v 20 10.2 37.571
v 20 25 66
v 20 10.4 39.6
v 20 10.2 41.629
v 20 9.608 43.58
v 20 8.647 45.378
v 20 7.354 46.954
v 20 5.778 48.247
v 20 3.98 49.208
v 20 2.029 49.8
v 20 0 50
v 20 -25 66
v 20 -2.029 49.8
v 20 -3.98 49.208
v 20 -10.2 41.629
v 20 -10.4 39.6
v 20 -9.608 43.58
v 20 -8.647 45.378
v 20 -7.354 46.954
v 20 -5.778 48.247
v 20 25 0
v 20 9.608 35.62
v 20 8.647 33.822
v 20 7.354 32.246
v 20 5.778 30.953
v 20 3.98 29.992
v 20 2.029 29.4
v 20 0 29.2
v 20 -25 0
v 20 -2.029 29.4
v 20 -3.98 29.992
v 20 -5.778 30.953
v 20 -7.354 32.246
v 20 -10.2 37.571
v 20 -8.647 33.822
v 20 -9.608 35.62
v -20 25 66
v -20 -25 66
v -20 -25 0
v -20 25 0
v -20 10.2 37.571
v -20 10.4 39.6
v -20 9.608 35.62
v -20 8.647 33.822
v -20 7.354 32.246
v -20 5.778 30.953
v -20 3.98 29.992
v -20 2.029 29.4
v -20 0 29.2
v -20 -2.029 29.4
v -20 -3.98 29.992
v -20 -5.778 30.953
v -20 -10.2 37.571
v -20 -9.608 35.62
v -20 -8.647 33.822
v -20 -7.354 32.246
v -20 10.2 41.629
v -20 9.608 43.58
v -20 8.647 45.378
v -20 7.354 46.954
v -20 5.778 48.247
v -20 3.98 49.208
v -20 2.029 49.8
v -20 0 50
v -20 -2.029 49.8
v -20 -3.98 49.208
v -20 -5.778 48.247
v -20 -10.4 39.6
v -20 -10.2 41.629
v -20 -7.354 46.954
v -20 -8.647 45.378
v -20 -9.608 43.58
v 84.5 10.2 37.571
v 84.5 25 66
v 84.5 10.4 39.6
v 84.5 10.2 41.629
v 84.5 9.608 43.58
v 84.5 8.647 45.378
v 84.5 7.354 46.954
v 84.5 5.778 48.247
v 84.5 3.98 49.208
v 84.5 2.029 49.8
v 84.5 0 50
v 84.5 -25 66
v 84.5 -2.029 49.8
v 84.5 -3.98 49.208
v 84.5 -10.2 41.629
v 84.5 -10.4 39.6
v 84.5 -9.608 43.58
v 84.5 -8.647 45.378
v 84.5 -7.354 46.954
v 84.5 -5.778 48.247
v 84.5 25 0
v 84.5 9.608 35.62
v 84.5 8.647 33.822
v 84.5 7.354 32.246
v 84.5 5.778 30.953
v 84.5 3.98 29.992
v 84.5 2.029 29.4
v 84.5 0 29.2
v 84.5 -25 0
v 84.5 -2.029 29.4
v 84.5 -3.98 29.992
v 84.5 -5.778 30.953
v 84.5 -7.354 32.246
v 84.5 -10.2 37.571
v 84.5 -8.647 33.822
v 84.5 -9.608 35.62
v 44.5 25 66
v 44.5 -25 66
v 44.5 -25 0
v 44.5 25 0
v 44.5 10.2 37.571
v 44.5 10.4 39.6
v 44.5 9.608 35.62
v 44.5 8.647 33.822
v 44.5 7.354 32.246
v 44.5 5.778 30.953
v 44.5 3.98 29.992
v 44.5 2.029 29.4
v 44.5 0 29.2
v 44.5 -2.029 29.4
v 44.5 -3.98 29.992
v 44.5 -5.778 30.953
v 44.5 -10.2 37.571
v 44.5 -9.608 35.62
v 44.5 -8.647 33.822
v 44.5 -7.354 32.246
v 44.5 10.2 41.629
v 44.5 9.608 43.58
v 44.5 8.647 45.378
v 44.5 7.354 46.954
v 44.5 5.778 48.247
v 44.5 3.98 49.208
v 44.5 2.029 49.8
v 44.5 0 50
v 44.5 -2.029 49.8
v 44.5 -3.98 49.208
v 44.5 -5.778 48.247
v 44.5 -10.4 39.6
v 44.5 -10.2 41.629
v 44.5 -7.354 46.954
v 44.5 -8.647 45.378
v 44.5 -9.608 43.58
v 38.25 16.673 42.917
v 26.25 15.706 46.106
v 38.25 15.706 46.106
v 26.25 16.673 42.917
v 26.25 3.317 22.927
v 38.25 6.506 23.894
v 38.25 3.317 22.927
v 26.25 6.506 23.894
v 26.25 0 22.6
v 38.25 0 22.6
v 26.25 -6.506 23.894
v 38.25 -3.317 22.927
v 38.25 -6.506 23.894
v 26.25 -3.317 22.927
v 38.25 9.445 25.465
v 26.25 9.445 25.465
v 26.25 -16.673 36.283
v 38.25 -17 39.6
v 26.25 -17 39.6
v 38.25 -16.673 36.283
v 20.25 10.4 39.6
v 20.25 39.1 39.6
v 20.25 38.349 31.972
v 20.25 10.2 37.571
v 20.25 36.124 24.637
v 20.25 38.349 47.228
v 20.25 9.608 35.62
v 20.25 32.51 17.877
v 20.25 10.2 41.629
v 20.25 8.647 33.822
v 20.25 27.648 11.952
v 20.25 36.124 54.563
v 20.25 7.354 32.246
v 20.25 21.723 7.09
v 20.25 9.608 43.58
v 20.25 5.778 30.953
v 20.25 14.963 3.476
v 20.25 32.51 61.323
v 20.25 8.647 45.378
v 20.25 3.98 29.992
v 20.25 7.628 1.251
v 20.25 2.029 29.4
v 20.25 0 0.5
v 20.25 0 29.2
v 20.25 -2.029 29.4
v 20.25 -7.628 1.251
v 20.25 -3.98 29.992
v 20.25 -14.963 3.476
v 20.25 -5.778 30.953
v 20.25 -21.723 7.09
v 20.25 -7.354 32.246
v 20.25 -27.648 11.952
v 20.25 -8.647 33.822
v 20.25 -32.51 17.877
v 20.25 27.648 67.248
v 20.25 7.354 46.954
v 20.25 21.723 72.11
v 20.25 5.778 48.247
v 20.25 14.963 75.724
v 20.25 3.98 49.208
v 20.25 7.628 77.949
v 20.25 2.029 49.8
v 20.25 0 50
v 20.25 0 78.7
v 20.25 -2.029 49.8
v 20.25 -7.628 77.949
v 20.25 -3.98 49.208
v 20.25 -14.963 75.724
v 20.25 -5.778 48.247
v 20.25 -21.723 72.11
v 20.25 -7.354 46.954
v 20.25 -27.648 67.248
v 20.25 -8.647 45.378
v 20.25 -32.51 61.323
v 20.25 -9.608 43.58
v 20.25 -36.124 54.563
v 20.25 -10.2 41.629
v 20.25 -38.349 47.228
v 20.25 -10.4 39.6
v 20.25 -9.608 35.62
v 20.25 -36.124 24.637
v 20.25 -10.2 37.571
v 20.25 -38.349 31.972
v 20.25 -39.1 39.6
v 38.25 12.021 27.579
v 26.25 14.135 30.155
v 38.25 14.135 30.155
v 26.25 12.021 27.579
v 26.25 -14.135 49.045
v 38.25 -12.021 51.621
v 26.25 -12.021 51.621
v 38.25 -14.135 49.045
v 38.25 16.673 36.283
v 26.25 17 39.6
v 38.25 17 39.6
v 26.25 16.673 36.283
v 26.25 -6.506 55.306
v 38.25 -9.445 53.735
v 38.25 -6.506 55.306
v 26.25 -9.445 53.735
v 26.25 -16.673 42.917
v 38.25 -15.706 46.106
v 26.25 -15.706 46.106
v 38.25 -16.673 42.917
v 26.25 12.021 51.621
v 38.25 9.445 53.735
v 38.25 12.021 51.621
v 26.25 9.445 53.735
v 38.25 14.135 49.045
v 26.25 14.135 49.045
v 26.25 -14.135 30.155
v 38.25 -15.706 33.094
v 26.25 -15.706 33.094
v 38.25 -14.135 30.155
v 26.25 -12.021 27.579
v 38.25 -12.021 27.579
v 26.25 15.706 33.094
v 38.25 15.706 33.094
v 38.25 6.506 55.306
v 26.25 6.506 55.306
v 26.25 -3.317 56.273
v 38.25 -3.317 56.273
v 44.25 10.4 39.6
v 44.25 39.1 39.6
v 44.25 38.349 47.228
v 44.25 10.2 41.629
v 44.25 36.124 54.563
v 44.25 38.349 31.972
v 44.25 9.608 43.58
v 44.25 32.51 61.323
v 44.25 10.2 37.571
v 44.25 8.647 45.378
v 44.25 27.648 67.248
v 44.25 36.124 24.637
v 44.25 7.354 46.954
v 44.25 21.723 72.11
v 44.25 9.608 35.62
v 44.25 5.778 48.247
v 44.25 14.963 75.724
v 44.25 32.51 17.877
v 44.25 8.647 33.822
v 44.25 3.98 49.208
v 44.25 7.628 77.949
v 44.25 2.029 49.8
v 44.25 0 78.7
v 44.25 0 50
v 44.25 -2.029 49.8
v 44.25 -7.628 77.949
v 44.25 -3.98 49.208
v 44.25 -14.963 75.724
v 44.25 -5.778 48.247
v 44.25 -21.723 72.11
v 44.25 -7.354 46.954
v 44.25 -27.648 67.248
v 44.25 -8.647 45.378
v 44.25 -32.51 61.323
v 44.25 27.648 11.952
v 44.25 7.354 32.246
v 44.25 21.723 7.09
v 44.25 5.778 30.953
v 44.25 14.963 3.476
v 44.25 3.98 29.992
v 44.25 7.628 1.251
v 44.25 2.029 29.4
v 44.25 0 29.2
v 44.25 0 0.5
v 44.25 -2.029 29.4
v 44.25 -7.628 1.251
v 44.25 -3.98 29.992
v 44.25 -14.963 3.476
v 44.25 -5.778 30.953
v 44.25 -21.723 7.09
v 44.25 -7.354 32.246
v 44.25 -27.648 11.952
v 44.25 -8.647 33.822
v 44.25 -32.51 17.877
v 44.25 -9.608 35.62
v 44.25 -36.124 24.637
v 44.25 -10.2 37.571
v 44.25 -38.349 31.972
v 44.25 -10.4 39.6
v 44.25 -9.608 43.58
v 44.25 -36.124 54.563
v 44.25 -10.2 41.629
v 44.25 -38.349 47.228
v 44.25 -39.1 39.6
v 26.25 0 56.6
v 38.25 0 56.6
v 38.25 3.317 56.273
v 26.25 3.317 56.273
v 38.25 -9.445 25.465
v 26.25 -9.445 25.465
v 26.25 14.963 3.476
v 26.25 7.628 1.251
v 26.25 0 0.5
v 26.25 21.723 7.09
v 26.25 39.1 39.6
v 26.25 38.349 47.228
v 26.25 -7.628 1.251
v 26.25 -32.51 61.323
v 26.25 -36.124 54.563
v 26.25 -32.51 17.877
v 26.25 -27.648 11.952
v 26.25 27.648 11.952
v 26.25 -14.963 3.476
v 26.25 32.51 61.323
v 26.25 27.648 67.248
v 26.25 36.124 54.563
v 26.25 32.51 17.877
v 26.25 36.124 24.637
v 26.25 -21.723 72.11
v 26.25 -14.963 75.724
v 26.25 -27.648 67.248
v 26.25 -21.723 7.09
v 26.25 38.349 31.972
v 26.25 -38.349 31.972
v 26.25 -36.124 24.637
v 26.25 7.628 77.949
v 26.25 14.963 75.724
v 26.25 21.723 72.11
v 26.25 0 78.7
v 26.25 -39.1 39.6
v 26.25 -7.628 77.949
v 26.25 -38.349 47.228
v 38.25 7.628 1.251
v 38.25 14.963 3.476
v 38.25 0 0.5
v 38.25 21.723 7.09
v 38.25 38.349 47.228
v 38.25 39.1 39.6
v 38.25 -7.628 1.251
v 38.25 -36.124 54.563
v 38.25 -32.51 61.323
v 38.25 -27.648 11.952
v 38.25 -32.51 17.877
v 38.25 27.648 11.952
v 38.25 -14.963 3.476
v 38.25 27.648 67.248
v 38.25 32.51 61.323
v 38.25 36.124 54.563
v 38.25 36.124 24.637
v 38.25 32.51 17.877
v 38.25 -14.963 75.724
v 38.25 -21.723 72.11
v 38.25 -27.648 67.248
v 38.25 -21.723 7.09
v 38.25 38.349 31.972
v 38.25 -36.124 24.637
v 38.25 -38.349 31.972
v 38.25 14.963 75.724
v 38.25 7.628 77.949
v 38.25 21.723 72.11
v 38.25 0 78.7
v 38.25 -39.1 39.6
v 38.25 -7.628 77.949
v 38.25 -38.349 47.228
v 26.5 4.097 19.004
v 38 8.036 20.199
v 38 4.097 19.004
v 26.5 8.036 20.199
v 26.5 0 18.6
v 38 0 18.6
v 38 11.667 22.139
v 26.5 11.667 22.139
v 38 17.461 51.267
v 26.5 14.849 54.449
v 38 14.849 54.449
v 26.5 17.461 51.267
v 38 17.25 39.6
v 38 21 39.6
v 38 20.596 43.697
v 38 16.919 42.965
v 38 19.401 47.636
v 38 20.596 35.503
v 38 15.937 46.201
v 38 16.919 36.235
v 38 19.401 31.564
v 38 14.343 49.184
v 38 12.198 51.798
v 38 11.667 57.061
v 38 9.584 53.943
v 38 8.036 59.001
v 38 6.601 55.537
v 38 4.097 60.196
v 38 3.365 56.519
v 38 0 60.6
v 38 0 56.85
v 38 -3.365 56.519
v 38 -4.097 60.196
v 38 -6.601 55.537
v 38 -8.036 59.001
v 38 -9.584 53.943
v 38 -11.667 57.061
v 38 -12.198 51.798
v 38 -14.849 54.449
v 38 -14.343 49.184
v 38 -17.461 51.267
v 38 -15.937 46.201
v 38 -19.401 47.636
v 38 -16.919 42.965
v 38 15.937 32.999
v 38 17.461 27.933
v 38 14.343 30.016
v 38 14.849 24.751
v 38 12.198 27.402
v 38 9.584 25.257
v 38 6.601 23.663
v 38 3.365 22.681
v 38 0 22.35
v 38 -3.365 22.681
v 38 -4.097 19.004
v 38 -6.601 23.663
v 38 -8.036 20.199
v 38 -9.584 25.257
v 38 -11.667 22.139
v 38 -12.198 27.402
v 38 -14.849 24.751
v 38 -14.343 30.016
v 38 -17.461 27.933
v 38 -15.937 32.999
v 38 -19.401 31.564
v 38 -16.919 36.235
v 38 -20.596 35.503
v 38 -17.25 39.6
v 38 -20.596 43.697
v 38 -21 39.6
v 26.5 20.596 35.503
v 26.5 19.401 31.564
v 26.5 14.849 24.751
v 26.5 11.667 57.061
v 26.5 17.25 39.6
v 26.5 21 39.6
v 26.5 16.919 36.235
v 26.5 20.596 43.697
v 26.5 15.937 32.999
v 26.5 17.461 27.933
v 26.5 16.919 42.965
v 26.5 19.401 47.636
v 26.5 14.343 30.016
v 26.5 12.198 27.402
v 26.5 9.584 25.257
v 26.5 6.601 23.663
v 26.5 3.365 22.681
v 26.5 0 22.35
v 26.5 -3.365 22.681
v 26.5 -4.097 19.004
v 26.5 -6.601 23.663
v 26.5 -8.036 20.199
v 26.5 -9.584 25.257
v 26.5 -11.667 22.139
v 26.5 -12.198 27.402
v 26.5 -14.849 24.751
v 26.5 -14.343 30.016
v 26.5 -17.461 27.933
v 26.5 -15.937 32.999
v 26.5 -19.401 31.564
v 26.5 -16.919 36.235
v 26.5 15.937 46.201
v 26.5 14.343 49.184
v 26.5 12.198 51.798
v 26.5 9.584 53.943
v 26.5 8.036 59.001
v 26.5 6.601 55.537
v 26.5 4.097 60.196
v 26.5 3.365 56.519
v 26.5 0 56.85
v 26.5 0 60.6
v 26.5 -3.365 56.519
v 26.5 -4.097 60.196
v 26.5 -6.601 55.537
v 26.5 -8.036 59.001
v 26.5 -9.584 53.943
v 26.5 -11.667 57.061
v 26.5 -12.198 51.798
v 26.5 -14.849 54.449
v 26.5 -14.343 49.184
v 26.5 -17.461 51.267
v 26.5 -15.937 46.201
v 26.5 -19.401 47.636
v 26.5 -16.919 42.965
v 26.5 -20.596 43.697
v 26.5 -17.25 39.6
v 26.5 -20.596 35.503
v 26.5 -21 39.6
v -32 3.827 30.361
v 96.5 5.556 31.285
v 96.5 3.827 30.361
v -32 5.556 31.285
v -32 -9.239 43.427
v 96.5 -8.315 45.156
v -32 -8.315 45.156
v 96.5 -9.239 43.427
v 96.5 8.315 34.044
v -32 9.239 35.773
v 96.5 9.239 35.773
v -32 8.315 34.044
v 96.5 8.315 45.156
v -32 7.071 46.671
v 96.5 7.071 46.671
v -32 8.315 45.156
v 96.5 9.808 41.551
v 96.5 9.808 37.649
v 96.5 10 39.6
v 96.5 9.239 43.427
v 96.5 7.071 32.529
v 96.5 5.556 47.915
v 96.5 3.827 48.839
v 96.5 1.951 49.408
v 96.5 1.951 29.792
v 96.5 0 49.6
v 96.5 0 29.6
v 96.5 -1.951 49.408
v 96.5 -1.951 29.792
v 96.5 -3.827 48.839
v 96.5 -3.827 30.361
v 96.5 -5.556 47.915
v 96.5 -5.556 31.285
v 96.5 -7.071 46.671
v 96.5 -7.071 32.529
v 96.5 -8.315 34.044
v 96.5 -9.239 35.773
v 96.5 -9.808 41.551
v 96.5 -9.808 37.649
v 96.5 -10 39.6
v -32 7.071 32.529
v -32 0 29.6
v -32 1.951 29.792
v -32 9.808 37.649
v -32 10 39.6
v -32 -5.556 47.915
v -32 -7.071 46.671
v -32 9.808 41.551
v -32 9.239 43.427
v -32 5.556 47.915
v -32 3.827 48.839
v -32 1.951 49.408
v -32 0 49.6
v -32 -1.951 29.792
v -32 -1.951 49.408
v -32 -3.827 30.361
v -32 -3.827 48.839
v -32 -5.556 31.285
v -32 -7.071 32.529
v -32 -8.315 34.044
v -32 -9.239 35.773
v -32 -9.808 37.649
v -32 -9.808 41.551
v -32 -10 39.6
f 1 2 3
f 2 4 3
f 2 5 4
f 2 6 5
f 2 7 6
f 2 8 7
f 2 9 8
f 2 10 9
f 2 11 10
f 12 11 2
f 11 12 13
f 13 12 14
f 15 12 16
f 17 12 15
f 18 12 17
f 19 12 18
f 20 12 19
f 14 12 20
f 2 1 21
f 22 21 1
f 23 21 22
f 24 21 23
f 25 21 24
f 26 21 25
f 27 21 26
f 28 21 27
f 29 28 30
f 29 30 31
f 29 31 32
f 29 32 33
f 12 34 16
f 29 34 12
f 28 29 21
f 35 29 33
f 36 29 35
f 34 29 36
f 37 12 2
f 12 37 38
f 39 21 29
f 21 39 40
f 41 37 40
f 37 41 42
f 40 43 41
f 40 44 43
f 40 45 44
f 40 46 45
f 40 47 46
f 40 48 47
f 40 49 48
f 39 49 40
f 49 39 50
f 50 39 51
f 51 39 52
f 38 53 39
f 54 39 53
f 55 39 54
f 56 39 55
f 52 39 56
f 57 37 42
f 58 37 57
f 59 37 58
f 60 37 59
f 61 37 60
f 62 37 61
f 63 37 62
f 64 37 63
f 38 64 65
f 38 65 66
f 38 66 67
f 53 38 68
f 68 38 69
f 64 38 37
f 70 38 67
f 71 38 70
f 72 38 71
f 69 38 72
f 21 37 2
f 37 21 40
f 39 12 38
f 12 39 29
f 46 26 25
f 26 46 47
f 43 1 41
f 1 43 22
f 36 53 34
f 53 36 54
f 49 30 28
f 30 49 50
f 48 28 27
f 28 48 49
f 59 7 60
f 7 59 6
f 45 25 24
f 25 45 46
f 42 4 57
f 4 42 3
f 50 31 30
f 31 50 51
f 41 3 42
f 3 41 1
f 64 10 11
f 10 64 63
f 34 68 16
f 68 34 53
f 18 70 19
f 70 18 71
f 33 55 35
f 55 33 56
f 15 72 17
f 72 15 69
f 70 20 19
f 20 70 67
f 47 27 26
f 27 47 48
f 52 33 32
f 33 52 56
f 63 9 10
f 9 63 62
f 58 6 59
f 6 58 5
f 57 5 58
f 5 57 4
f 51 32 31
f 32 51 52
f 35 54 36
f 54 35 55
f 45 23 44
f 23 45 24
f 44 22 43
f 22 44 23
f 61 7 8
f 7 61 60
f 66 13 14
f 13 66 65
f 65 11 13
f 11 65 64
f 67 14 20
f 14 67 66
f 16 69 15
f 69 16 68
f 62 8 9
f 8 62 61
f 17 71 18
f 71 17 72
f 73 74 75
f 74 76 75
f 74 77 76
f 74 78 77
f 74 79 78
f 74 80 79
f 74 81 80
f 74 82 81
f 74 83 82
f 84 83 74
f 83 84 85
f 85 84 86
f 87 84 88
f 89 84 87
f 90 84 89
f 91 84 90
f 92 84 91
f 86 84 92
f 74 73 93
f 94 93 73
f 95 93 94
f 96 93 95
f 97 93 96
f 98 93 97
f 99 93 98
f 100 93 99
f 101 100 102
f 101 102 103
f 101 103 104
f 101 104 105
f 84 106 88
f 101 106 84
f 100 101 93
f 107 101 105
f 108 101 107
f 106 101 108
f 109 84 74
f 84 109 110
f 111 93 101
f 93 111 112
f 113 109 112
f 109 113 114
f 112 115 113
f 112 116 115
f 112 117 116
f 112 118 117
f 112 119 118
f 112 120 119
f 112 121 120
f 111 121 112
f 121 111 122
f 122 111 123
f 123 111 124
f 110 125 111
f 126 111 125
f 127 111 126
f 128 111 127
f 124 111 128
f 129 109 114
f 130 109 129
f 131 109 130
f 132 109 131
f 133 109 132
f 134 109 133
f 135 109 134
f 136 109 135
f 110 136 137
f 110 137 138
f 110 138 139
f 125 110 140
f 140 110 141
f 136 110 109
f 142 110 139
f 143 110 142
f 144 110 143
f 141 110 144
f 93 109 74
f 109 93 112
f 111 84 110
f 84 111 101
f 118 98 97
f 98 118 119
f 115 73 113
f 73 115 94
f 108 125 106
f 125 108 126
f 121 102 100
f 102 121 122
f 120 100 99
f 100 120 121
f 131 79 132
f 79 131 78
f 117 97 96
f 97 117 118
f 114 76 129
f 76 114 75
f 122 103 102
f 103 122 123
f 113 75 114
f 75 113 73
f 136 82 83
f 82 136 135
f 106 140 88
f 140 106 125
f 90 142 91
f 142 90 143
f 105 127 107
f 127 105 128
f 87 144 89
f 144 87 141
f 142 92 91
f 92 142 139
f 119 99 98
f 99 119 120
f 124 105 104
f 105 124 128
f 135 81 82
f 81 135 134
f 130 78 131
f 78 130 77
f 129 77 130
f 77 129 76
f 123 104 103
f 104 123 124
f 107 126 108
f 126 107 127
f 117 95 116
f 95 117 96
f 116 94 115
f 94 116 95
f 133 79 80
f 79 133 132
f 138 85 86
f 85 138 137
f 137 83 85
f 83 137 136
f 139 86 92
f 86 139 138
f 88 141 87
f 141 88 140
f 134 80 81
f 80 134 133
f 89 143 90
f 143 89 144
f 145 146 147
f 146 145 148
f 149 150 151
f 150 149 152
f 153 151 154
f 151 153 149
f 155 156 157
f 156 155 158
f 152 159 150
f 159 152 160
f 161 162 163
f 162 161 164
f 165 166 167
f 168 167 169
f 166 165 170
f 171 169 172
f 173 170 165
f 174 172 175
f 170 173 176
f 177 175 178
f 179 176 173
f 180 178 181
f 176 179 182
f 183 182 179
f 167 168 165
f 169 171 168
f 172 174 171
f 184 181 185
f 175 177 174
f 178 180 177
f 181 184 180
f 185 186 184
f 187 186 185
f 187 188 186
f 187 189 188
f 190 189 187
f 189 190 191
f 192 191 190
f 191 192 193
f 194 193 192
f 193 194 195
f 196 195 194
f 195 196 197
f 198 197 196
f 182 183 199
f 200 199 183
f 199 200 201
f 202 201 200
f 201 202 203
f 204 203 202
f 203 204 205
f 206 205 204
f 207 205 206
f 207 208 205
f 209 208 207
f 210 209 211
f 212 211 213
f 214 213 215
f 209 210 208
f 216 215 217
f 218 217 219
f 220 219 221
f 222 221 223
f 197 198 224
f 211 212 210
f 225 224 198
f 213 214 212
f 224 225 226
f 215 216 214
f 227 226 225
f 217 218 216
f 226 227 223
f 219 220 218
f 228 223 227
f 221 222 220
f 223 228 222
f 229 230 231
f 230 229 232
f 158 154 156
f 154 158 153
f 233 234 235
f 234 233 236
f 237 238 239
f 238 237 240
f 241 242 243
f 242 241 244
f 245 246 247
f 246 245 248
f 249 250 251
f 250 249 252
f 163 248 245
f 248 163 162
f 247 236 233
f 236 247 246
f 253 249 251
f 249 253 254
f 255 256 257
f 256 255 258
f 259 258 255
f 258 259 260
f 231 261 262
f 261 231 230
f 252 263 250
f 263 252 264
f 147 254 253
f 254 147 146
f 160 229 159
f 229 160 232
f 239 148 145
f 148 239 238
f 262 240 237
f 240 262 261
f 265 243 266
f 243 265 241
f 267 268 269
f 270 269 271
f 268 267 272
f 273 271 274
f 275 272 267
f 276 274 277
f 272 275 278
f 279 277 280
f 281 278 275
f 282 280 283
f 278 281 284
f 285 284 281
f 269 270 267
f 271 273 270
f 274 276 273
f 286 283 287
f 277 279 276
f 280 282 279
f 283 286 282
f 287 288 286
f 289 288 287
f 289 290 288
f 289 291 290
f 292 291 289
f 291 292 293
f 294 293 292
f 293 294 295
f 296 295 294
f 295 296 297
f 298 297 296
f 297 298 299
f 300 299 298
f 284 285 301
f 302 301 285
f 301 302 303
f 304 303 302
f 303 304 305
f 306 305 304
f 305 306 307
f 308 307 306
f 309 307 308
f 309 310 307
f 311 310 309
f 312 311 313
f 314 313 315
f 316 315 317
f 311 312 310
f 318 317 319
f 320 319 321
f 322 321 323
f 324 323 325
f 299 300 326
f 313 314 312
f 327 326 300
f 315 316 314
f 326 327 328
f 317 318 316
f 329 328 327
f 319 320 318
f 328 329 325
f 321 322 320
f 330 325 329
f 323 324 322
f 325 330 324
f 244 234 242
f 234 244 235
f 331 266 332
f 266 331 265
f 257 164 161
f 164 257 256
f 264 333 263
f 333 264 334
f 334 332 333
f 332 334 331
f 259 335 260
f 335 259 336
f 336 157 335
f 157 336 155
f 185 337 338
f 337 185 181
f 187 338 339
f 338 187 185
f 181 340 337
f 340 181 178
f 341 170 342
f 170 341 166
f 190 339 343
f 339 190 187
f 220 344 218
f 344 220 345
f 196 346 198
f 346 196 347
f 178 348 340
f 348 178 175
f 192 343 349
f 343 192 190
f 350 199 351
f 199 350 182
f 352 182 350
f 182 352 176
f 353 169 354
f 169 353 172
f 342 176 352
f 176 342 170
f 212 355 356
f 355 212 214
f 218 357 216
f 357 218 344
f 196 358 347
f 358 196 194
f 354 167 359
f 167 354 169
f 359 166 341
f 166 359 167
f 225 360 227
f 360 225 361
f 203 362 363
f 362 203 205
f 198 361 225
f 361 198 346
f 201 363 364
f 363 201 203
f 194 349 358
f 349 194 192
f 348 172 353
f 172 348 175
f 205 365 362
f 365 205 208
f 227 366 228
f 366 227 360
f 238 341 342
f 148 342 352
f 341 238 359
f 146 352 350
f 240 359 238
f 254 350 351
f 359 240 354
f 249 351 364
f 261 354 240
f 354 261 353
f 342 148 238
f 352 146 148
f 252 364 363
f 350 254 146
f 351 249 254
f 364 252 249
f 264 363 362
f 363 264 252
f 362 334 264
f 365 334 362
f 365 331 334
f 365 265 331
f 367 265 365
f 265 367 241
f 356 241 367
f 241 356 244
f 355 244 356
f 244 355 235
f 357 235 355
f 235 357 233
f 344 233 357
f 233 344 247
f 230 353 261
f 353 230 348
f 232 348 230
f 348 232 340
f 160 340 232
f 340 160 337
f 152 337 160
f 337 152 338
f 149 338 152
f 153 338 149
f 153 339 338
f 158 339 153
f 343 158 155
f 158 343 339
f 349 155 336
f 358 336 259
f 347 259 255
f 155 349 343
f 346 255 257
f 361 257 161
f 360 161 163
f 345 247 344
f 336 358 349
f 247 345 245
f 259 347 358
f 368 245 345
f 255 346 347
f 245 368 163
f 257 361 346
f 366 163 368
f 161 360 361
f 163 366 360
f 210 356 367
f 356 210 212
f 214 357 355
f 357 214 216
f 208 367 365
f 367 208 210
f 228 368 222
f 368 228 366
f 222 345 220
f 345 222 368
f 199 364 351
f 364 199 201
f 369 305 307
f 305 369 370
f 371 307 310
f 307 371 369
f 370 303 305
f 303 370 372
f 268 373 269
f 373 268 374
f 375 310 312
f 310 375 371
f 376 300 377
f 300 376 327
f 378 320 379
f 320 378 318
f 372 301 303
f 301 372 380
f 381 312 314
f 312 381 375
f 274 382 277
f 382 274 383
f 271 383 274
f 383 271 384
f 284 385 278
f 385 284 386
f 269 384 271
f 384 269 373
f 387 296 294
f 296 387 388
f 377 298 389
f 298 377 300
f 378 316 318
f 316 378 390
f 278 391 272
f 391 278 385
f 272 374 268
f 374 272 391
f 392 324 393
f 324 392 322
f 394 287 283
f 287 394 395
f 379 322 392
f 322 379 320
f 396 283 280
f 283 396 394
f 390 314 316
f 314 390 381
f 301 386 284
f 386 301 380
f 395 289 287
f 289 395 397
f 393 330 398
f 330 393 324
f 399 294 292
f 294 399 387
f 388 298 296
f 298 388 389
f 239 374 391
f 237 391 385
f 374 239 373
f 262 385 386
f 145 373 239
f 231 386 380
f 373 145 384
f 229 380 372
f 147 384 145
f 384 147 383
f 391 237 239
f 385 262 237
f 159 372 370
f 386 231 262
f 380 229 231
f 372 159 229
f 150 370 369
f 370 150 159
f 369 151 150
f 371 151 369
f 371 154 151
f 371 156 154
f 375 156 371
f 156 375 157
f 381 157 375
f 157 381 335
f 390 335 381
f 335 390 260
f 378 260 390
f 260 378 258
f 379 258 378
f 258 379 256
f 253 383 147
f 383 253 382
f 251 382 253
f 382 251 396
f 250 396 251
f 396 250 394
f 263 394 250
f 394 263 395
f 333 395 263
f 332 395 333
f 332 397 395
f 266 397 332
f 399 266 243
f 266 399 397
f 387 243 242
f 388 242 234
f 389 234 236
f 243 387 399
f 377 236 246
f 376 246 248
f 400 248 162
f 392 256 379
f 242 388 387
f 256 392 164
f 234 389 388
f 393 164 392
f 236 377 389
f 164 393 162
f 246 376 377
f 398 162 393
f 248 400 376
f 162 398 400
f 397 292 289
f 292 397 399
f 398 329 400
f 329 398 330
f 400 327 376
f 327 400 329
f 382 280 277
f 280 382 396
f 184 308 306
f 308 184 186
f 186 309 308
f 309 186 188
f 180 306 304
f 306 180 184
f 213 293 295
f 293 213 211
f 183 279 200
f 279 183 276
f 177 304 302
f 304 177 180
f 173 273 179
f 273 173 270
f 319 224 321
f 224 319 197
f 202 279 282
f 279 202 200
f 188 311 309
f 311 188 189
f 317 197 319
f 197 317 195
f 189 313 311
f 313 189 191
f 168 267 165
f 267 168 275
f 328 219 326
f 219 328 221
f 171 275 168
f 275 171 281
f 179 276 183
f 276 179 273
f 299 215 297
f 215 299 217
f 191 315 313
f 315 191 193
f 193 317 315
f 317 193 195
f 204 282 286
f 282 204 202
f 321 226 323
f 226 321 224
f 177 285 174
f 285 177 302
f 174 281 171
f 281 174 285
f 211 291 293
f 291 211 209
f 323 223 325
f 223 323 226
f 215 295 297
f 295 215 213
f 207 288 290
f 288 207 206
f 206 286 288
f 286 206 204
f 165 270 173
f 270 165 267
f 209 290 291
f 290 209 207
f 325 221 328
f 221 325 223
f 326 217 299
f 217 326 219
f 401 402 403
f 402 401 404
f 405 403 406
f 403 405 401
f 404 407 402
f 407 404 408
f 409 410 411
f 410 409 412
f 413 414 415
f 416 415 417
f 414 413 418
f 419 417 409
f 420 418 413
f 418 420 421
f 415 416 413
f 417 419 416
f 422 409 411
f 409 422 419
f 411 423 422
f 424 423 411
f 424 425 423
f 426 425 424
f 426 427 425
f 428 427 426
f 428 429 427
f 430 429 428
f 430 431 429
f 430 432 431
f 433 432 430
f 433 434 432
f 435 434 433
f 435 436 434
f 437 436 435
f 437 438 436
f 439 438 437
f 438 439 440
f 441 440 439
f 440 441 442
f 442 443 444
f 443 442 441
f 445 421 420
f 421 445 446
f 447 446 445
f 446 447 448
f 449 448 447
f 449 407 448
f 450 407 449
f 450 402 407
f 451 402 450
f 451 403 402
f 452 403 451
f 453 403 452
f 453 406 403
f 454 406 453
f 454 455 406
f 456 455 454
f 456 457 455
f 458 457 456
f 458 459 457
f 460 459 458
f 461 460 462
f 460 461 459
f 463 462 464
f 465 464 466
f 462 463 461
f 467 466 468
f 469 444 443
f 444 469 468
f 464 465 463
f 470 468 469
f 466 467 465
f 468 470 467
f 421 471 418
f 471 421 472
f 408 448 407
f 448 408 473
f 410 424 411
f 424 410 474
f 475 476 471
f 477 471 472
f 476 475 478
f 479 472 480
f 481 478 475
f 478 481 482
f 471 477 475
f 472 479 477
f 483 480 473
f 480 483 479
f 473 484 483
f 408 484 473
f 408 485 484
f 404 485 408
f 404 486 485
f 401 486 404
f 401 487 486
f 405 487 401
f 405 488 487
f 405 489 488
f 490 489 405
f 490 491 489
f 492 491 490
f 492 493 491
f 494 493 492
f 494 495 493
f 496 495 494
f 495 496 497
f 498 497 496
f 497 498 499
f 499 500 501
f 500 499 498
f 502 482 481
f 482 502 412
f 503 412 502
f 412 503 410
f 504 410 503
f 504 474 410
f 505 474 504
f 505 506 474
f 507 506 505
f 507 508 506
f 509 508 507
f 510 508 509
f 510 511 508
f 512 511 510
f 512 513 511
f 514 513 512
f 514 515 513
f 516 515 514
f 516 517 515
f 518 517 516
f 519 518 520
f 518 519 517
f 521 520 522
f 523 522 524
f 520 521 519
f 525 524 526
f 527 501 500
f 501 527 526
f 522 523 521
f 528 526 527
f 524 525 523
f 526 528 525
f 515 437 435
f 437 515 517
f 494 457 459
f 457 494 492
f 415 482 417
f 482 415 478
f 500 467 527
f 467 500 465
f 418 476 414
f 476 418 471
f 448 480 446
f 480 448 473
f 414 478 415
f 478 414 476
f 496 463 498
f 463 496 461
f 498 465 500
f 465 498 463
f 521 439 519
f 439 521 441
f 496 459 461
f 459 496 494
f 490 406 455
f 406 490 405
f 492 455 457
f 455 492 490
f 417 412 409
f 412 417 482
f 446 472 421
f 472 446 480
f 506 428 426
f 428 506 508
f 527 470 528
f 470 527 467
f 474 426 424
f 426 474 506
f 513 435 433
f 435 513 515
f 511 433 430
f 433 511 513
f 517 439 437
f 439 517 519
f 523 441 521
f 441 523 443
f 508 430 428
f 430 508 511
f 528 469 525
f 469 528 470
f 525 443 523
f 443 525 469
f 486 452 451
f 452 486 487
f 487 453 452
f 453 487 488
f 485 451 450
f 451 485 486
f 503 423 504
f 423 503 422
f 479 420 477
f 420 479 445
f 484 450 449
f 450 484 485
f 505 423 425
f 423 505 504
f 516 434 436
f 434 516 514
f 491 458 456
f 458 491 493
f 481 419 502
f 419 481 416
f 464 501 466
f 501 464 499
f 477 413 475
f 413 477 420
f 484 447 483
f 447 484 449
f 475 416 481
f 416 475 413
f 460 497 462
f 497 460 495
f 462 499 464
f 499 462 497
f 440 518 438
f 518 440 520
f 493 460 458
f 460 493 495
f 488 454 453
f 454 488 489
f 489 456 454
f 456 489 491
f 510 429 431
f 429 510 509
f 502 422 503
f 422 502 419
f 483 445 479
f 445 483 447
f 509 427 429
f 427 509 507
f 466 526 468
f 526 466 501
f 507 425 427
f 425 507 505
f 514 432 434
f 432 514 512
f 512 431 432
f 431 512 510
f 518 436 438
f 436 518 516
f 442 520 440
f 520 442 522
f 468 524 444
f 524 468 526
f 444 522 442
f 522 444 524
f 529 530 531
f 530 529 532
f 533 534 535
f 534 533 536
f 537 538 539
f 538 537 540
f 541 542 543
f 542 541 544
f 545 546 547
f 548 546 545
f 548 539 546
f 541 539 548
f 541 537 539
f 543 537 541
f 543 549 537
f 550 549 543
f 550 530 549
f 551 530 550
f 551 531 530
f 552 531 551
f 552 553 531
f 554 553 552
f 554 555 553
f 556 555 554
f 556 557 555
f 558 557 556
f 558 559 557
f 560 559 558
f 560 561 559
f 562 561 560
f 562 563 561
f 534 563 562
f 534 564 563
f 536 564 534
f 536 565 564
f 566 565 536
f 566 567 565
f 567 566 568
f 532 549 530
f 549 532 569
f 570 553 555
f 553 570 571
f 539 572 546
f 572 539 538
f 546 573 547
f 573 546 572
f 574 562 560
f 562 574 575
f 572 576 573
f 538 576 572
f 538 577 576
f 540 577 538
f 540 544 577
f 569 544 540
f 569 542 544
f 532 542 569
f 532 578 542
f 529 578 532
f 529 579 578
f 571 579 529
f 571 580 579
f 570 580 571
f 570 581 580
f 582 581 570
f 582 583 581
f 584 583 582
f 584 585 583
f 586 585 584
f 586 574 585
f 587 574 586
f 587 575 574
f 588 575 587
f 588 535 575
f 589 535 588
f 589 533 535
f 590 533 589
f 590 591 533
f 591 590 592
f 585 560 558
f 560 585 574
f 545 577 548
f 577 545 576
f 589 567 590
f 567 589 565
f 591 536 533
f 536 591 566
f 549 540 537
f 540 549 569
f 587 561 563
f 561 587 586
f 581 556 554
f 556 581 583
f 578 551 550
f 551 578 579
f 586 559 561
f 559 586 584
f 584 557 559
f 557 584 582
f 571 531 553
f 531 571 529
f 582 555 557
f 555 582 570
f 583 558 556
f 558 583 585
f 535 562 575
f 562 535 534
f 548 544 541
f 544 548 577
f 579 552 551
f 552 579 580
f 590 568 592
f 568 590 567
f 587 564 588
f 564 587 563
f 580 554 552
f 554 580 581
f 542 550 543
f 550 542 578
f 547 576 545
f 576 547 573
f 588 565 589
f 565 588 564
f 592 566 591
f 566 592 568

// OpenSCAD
$fn = 32;

// ------------------------------------------------------------------------
// Pulley assembly: d78.2 pulley with a belt, shaft d20
// Every part is its own module, assembly() places them once.
// ------------------------------------------------------------------------

// --- part 1 ---
module support1() {
  difference() {
    translate([-20, -25, 0]) cube([40, 50, 66]);
    translate([0, 0, 39.6]) rotate([0, 90, 0]) cylinder(h = 42, d = 20.8, center = true);
  }
}

// --- part 2 ---
module support2() {
  difference() {
    translate([-20, -25, 0]) cube([40, 50, 66]);
    translate([0, 0, 39.6]) rotate([0, 90, 0]) cylinder(h = 42, d = 20.8, center = true);
  }
}

// --- part 3 ---
module shaft() {
  translate([0, 0, -64.25]) cylinder(h = 128.5, d = 20);
}

// --- part 4 ---
module pulley() {
  difference() {
    union() {
      cylinder(h = 24, d = 34);
      cylinder(h = 6, d = 78.2);
      translate([0, 0, 18]) cylinder(h = 6, d = 78.2);
    }
    translate([0, 0, -1]) cylinder(h = 26, d = 20.8);
  }
}

// --- part 5 ---
module belt() {
  difference() {
      translate([0, 0, 0]) cylinder(h = 11.5, d = 42);
      translate([0, 0, -1]) cylinder(h = 13.5, d = 34.5);
    }
}

// --- assembly ---
module assembly() {
  translate([0, 0, 0]) rotate([0, 0, 0]) support1();
  translate([64.5, 0, 0]) rotate([0, 0, 0]) support2();
  translate([32.25, 0, 39.6]) rotate([0, 90, 0]) shaft();
  translate([20.25, 0, 39.6]) rotate([0, 90, 0]) pulley();
  translate([26.5, 0, 39.6]) rotate([0, 90, 0]) belt();
}

assembly();
